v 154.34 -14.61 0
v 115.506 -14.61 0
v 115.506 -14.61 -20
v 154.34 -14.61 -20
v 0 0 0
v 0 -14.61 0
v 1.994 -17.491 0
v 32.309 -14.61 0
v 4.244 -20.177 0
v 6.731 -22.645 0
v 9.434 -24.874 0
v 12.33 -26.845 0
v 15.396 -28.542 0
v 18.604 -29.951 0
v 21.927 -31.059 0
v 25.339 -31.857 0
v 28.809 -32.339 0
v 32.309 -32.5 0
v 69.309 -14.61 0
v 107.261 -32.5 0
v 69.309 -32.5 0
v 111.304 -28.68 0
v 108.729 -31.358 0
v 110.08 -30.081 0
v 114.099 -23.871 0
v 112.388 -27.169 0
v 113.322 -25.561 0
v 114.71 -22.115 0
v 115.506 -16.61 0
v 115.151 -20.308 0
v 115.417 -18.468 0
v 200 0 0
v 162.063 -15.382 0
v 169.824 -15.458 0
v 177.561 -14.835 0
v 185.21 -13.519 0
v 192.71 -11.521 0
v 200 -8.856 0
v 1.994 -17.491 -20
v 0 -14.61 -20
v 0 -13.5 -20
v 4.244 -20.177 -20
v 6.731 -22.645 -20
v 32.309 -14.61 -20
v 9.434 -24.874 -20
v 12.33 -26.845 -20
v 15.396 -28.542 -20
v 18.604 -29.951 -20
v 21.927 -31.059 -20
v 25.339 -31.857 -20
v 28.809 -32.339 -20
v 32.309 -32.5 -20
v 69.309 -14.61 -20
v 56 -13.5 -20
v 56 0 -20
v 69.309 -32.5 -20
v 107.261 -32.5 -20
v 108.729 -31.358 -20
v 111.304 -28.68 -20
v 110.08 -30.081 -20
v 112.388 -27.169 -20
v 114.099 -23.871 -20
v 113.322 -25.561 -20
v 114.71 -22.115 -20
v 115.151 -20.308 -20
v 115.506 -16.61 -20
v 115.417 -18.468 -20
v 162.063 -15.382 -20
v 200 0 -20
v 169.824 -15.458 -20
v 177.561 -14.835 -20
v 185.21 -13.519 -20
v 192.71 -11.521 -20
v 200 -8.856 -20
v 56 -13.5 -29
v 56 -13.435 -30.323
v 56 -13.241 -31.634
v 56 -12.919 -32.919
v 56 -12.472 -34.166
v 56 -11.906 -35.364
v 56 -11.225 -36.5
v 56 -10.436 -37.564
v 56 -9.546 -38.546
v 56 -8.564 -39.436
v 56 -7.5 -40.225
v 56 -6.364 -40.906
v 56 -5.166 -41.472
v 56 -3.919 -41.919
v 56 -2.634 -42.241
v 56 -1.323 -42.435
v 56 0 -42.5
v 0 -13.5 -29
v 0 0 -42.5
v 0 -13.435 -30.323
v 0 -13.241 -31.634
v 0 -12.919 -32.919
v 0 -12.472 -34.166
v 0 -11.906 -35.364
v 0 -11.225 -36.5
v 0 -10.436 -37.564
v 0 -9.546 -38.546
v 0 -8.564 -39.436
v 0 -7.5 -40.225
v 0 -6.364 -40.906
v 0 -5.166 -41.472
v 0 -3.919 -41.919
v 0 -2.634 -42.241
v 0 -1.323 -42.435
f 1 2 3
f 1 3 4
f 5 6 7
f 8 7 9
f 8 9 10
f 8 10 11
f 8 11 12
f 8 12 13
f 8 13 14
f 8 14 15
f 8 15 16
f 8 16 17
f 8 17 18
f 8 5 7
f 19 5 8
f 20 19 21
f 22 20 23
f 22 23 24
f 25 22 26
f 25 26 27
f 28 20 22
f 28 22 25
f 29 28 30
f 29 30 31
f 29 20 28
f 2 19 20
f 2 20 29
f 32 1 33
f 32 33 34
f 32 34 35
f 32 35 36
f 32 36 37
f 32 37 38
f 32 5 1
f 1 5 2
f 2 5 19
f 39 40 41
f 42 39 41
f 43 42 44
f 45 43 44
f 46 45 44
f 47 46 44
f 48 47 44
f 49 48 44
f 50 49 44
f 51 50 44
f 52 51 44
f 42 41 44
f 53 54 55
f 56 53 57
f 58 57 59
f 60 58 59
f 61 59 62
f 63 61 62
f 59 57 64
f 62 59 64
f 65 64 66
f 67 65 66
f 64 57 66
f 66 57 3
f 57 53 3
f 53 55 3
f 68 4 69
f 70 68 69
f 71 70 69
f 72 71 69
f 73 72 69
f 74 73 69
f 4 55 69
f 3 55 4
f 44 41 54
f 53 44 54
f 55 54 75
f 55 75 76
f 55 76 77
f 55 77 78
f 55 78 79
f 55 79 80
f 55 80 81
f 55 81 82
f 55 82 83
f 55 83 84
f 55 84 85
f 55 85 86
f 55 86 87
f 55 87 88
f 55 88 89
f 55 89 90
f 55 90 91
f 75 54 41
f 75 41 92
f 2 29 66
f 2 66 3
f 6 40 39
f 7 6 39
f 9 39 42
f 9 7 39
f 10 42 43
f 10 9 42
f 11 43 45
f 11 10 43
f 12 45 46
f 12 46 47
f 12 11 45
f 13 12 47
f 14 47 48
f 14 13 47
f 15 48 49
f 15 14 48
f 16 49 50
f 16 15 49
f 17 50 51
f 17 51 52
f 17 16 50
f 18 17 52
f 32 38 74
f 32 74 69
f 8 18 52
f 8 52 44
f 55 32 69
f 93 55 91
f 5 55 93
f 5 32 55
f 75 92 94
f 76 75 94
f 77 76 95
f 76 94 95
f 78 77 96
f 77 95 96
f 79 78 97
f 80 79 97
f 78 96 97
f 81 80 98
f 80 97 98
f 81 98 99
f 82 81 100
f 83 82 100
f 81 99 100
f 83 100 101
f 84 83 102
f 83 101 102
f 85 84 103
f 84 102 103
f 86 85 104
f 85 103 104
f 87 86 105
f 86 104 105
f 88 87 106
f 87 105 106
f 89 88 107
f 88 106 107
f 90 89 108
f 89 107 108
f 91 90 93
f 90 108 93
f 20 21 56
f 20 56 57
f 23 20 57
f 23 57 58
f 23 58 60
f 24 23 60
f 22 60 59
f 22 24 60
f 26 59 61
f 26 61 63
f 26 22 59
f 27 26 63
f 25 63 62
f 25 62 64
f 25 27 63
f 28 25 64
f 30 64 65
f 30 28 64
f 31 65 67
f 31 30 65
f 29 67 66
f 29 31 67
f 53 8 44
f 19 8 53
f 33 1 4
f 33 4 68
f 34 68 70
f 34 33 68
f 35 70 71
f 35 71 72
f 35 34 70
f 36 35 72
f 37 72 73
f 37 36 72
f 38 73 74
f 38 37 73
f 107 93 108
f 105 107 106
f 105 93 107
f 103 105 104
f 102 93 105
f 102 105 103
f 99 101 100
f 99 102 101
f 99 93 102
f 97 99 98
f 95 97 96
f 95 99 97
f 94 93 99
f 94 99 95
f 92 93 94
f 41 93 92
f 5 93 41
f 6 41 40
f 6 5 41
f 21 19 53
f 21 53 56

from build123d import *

# Parameters (mm, degrees)
F2_DEPTH = 20
F3_DEPTH = 56
F4_DEPTH = 52


with BuildPart() as f2:
    # F0 (on Top) → F2 (new body)
    with BuildSketch(Plane.XY):
        with BuildLine():
            Line((200, 0), (0, 0))
            Line((0, 0), (0, -14.61))
            ThreePointArc((0, -14.61), (13.843459, -27.728929), (32.309226, -32.5))
            Line((32.309226, -32.5), (32.309226, -14.61))
            Line((32.309226, -14.61), (69.309226, -14.61))
            Line((69.309226, -14.61), (69.309226, -32.5))
            Line((69.309226, -32.5), (107.261054, -32.5))
            ThreePointArc((107.261054, -32.5), (113.322375, -25.56096), (115.506455, -16.61))
            Line((115.506455, -16.61), (115.506455, -14.61))
            Line((115.506455, -14.61), (154.339641, -14.61))
            ThreePointArc((154.339641, -14.61), (177.560637, -14.834695), (200, -8.85639))
            Line((200, -8.85639), (200, 0))
        make_face()
    extrude(amount=-F2_DEPTH)

    # F1 (on Right) → F3 (join)
    with BuildSketch(Plane.YZ):
        with BuildLine():
            Line((0, -38.5), (0, -19.5))
            ThreePointArc((0, -19.5), (-9.5, -29), (0, -38.5))
        make_face()
        with BuildLine():
            Line((0, -19.5), (0, -11.71401))
            Line((0, -11.71401), (-13.5, -11.71401))
            Line((-13.5, -11.71401), (-13.5, -29))
            ThreePointArc((-13.5, -29), (-9.545942, -38.545942), (0, -42.5))
            Line((0, -42.5), (0, -38.5))
            ThreePointArc((0, -38.5), (-9.5, -29), (0, -19.5))
        make_face()
    extrude(amount=F3_DEPTH)

    # F1 (on Right) → F4 (cut)
    with BuildSketch(Plane.YZ):
        with BuildLine():
            Line((0, -38.5), (0, -19.5))
            ThreePointArc((0, -19.5), (-9.5, -29), (0, -38.5))
        make_face()
    extrude(amount=-F4_DEPTH, mode=Mode.SUBTRACT)


solid = f2.part
